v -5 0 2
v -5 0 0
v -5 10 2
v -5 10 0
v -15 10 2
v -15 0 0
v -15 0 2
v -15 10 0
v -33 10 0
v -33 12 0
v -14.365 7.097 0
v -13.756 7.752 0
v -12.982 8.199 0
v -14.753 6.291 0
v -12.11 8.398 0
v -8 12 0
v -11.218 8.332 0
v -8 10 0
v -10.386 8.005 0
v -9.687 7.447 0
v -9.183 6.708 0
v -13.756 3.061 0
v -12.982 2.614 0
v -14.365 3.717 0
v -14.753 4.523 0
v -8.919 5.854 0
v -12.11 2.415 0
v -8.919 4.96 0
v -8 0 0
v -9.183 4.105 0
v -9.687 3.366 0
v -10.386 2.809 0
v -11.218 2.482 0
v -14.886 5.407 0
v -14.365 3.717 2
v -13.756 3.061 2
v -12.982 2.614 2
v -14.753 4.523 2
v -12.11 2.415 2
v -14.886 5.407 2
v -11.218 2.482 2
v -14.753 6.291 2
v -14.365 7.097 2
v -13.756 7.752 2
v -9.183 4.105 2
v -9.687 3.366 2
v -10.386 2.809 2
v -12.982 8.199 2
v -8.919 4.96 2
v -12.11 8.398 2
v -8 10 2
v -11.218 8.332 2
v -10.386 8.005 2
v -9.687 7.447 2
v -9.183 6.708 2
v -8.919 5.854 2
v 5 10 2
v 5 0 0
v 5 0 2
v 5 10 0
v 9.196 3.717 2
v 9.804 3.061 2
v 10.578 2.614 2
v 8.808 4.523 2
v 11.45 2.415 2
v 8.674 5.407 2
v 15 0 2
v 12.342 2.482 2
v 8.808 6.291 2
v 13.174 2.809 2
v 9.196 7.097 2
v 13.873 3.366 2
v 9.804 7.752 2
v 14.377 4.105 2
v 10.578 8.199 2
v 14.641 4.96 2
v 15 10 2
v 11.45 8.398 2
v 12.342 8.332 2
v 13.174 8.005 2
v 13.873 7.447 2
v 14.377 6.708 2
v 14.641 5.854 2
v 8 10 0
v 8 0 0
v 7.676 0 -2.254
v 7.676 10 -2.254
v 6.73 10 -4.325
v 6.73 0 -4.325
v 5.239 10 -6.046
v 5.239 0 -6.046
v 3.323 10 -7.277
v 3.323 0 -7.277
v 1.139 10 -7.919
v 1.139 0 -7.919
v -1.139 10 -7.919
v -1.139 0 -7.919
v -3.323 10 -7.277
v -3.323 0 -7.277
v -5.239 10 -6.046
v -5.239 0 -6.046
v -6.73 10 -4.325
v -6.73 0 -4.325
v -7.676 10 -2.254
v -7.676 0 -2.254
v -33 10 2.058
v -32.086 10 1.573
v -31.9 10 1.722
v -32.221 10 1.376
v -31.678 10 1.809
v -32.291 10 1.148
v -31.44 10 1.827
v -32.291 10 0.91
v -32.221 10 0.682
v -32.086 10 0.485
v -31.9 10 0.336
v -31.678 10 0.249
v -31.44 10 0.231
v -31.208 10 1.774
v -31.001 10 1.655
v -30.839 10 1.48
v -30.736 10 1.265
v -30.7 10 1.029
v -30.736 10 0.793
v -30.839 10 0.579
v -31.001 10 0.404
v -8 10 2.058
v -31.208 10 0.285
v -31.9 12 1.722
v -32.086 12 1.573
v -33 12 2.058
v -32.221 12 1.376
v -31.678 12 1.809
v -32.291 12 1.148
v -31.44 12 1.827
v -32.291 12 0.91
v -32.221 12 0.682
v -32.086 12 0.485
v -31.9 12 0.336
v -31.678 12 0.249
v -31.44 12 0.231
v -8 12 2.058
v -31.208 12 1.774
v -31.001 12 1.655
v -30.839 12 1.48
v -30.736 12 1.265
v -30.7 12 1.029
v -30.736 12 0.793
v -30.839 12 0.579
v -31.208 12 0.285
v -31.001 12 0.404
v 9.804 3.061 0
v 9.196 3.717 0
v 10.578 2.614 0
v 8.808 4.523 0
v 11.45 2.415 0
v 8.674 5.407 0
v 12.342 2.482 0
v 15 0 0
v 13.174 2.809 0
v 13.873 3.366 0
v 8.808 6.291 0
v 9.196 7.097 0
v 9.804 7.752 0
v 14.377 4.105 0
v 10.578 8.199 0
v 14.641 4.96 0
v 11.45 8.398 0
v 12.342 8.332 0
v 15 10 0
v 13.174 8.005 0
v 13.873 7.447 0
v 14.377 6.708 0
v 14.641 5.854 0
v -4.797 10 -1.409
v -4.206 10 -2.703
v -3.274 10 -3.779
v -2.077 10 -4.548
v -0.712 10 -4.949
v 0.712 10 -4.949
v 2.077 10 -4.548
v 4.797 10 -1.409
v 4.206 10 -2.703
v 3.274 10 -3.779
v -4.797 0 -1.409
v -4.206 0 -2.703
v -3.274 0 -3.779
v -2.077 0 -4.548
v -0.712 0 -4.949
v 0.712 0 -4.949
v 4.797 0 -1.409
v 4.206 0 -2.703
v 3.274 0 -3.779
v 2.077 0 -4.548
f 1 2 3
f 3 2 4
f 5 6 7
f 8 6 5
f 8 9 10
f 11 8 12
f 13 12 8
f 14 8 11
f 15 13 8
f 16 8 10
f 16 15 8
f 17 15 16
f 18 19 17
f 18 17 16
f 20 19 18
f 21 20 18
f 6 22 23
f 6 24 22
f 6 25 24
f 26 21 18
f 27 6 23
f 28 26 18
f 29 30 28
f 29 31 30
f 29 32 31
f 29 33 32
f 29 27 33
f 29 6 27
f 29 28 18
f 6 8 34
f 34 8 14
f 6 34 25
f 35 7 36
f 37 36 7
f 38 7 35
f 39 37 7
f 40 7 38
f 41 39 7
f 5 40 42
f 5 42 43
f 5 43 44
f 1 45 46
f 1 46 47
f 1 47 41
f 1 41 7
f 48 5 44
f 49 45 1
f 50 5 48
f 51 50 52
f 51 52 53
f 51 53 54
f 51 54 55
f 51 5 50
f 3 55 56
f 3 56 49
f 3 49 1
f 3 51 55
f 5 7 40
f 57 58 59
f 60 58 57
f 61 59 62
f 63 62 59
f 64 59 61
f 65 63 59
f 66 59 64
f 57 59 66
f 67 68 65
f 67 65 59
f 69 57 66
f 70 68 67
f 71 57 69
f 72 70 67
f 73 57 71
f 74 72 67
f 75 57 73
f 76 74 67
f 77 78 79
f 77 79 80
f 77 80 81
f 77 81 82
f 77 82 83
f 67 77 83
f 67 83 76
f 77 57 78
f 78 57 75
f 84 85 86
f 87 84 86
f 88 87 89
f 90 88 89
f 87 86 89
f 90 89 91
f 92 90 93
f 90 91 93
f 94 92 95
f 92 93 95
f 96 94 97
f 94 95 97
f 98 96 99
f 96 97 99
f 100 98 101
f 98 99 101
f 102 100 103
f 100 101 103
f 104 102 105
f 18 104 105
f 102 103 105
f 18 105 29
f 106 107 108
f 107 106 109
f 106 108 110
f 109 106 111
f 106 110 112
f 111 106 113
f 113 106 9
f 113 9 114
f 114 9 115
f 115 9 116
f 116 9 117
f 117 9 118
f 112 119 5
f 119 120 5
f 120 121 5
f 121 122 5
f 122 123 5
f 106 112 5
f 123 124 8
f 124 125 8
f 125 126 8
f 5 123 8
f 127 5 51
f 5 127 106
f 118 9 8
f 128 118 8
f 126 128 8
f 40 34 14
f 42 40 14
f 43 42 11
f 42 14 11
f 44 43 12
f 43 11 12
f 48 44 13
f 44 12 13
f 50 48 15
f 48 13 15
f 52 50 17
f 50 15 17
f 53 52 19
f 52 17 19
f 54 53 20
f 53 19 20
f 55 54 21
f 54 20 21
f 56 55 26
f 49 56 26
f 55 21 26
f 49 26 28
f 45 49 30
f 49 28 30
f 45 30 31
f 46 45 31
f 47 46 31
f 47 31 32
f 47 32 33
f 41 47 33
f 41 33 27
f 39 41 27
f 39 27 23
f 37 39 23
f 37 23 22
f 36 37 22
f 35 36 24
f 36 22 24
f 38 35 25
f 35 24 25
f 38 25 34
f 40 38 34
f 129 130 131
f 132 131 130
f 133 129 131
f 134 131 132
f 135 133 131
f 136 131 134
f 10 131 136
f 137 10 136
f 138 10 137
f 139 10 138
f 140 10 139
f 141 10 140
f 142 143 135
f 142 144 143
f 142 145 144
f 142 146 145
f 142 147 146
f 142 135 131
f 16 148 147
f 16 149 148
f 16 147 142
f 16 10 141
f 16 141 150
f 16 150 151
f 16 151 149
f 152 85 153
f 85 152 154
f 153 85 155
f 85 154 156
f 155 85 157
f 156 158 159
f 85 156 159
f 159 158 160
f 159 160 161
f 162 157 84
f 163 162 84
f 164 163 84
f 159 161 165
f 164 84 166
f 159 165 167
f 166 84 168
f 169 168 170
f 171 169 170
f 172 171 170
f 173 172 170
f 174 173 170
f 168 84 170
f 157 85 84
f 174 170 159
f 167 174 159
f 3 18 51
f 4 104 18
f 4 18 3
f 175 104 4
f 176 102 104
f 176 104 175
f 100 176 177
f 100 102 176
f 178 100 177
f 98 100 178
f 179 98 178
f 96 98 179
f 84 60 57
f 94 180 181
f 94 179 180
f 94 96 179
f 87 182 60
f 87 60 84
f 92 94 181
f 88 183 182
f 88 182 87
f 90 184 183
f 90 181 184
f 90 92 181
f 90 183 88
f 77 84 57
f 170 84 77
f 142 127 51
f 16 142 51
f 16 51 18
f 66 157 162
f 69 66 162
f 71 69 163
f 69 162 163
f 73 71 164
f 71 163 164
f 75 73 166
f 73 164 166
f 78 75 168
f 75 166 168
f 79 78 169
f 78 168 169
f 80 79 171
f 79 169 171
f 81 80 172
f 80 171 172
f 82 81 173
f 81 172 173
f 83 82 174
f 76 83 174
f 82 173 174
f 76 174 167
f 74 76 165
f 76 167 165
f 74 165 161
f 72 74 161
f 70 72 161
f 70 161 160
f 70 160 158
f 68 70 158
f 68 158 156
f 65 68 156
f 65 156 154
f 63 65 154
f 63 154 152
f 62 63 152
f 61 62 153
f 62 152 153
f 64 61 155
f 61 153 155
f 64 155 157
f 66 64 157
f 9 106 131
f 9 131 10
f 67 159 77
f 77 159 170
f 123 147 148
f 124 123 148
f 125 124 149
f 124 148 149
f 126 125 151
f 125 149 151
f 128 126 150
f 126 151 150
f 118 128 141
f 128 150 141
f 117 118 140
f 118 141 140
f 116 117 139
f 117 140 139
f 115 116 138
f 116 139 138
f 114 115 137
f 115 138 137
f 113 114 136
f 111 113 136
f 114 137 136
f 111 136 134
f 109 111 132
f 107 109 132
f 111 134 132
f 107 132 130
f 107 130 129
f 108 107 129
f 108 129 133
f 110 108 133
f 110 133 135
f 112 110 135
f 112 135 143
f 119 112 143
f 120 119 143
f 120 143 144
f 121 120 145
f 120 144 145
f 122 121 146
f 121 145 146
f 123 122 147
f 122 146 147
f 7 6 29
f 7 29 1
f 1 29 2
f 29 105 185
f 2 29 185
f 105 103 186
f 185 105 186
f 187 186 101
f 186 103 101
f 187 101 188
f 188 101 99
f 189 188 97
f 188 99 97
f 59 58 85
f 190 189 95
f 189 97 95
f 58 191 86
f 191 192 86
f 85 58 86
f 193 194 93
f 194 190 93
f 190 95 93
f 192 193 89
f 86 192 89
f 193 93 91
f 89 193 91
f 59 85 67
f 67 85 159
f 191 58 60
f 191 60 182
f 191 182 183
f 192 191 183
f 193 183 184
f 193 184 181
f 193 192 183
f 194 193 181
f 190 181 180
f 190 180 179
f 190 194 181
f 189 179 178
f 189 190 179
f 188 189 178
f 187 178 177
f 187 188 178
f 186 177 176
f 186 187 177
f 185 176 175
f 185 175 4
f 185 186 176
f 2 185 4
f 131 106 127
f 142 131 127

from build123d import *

# Parameters (mm, degrees)
SKETCH2_R           = 8
SKETCH2_R_2         = 5
EXTRUDE_THIN1_DEPTH = 10
CUT_EXTRUDE1_DEPTH  = 10
SKETCH4_W           = 10
SKETCH4_H           = 10
BOSS_EXTRUDE1_DEPTH = 2
SKETCH5_R           = 3
CUT_EXTRUDE2_DEPTH  = 2
SKETCH6_W           = 25
SKETCH6_H           = 2.057623051
BOSS_EXTRUDE2_DEPTH = 2
SKETCH7_R           = 0.8
CUT_EXTRUDE3_DEPTH  = 2


with BuildPart() as part:
    # Sketch2 → Extrude-Thin1 (new body)
    with BuildSketch(Plane(origin=(0, 0, 0), x_dir=(1, 0, 0), z_dir=(0, 1, 0))):
        Circle(SKETCH2_R)
        Circle(SKETCH2_R_2, mode=Mode.SUBTRACT)
    extrude(amount=EXTRUDE_THIN1_DEPTH)

    # Sketch3 → Cut-Extrude1 (cut)
    with BuildSketch(Plane(origin=(0, 10, 0), x_dir=(1, 0, 0), z_dir=(0, 1, 0))):
        with BuildLine():
            Line((-8, 0), (8, 0))
            ThreePointArc((8, 0), (0, -8), (-8, 0))
        make_face()
    extrude(amount=-CUT_EXTRUDE1_DEPTH, mode=Mode.SUBTRACT)

    # Sketch4 → Boss-Extrude1 (add)
    with BuildSketch(Plane.XY):
        with Locations((10, 5)):
            Rectangle(SKETCH4_W, SKETCH4_H)
        with Locations((-10, 5)):
            Rectangle(SKETCH4_W, SKETCH4_H)
    extrude(amount=BOSS_EXTRUDE1_DEPTH)

    # Sketch5 → Cut-Extrude2 (cut)
    with BuildSketch(Plane(origin=(0, 0, 0), x_dir=(-1, 0, 0), z_dir=(0, 0, -1))):
        with Locations((-11.674262076, 5.406814048)):
            Circle(SKETCH5_R)
        with Locations((11.885931395, 5.406814048)):
            Circle(SKETCH5_R)
    extrude(amount=-CUT_EXTRUDE2_DEPTH, mode=Mode.SUBTRACT)

    # Sketch6 → Boss-Extrude2 (add)
    with BuildSketch(Plane(origin=(0, 10, 0), x_dir=(1, 0, 0), z_dir=(0, 1, 0))):
        with Locations((-20.5, -1.028811526)):
            Rectangle(SKETCH6_W, SKETCH6_H)
    extrude(amount=BOSS_EXTRUDE2_DEPTH)

    # Sketch7 → Cut-Extrude3 (cut)
    with BuildSketch(Plane(origin=(0, 12, 0), x_dir=(1, 0, 0), z_dir=(0, 1, 0))):
        with Locations((-31.5, -1.029261487)):
            Circle(SKETCH7_R)
    extrude(amount=-CUT_EXTRUDE3_DEPTH, mode=Mode.SUBTRACT)


solid = part.part
